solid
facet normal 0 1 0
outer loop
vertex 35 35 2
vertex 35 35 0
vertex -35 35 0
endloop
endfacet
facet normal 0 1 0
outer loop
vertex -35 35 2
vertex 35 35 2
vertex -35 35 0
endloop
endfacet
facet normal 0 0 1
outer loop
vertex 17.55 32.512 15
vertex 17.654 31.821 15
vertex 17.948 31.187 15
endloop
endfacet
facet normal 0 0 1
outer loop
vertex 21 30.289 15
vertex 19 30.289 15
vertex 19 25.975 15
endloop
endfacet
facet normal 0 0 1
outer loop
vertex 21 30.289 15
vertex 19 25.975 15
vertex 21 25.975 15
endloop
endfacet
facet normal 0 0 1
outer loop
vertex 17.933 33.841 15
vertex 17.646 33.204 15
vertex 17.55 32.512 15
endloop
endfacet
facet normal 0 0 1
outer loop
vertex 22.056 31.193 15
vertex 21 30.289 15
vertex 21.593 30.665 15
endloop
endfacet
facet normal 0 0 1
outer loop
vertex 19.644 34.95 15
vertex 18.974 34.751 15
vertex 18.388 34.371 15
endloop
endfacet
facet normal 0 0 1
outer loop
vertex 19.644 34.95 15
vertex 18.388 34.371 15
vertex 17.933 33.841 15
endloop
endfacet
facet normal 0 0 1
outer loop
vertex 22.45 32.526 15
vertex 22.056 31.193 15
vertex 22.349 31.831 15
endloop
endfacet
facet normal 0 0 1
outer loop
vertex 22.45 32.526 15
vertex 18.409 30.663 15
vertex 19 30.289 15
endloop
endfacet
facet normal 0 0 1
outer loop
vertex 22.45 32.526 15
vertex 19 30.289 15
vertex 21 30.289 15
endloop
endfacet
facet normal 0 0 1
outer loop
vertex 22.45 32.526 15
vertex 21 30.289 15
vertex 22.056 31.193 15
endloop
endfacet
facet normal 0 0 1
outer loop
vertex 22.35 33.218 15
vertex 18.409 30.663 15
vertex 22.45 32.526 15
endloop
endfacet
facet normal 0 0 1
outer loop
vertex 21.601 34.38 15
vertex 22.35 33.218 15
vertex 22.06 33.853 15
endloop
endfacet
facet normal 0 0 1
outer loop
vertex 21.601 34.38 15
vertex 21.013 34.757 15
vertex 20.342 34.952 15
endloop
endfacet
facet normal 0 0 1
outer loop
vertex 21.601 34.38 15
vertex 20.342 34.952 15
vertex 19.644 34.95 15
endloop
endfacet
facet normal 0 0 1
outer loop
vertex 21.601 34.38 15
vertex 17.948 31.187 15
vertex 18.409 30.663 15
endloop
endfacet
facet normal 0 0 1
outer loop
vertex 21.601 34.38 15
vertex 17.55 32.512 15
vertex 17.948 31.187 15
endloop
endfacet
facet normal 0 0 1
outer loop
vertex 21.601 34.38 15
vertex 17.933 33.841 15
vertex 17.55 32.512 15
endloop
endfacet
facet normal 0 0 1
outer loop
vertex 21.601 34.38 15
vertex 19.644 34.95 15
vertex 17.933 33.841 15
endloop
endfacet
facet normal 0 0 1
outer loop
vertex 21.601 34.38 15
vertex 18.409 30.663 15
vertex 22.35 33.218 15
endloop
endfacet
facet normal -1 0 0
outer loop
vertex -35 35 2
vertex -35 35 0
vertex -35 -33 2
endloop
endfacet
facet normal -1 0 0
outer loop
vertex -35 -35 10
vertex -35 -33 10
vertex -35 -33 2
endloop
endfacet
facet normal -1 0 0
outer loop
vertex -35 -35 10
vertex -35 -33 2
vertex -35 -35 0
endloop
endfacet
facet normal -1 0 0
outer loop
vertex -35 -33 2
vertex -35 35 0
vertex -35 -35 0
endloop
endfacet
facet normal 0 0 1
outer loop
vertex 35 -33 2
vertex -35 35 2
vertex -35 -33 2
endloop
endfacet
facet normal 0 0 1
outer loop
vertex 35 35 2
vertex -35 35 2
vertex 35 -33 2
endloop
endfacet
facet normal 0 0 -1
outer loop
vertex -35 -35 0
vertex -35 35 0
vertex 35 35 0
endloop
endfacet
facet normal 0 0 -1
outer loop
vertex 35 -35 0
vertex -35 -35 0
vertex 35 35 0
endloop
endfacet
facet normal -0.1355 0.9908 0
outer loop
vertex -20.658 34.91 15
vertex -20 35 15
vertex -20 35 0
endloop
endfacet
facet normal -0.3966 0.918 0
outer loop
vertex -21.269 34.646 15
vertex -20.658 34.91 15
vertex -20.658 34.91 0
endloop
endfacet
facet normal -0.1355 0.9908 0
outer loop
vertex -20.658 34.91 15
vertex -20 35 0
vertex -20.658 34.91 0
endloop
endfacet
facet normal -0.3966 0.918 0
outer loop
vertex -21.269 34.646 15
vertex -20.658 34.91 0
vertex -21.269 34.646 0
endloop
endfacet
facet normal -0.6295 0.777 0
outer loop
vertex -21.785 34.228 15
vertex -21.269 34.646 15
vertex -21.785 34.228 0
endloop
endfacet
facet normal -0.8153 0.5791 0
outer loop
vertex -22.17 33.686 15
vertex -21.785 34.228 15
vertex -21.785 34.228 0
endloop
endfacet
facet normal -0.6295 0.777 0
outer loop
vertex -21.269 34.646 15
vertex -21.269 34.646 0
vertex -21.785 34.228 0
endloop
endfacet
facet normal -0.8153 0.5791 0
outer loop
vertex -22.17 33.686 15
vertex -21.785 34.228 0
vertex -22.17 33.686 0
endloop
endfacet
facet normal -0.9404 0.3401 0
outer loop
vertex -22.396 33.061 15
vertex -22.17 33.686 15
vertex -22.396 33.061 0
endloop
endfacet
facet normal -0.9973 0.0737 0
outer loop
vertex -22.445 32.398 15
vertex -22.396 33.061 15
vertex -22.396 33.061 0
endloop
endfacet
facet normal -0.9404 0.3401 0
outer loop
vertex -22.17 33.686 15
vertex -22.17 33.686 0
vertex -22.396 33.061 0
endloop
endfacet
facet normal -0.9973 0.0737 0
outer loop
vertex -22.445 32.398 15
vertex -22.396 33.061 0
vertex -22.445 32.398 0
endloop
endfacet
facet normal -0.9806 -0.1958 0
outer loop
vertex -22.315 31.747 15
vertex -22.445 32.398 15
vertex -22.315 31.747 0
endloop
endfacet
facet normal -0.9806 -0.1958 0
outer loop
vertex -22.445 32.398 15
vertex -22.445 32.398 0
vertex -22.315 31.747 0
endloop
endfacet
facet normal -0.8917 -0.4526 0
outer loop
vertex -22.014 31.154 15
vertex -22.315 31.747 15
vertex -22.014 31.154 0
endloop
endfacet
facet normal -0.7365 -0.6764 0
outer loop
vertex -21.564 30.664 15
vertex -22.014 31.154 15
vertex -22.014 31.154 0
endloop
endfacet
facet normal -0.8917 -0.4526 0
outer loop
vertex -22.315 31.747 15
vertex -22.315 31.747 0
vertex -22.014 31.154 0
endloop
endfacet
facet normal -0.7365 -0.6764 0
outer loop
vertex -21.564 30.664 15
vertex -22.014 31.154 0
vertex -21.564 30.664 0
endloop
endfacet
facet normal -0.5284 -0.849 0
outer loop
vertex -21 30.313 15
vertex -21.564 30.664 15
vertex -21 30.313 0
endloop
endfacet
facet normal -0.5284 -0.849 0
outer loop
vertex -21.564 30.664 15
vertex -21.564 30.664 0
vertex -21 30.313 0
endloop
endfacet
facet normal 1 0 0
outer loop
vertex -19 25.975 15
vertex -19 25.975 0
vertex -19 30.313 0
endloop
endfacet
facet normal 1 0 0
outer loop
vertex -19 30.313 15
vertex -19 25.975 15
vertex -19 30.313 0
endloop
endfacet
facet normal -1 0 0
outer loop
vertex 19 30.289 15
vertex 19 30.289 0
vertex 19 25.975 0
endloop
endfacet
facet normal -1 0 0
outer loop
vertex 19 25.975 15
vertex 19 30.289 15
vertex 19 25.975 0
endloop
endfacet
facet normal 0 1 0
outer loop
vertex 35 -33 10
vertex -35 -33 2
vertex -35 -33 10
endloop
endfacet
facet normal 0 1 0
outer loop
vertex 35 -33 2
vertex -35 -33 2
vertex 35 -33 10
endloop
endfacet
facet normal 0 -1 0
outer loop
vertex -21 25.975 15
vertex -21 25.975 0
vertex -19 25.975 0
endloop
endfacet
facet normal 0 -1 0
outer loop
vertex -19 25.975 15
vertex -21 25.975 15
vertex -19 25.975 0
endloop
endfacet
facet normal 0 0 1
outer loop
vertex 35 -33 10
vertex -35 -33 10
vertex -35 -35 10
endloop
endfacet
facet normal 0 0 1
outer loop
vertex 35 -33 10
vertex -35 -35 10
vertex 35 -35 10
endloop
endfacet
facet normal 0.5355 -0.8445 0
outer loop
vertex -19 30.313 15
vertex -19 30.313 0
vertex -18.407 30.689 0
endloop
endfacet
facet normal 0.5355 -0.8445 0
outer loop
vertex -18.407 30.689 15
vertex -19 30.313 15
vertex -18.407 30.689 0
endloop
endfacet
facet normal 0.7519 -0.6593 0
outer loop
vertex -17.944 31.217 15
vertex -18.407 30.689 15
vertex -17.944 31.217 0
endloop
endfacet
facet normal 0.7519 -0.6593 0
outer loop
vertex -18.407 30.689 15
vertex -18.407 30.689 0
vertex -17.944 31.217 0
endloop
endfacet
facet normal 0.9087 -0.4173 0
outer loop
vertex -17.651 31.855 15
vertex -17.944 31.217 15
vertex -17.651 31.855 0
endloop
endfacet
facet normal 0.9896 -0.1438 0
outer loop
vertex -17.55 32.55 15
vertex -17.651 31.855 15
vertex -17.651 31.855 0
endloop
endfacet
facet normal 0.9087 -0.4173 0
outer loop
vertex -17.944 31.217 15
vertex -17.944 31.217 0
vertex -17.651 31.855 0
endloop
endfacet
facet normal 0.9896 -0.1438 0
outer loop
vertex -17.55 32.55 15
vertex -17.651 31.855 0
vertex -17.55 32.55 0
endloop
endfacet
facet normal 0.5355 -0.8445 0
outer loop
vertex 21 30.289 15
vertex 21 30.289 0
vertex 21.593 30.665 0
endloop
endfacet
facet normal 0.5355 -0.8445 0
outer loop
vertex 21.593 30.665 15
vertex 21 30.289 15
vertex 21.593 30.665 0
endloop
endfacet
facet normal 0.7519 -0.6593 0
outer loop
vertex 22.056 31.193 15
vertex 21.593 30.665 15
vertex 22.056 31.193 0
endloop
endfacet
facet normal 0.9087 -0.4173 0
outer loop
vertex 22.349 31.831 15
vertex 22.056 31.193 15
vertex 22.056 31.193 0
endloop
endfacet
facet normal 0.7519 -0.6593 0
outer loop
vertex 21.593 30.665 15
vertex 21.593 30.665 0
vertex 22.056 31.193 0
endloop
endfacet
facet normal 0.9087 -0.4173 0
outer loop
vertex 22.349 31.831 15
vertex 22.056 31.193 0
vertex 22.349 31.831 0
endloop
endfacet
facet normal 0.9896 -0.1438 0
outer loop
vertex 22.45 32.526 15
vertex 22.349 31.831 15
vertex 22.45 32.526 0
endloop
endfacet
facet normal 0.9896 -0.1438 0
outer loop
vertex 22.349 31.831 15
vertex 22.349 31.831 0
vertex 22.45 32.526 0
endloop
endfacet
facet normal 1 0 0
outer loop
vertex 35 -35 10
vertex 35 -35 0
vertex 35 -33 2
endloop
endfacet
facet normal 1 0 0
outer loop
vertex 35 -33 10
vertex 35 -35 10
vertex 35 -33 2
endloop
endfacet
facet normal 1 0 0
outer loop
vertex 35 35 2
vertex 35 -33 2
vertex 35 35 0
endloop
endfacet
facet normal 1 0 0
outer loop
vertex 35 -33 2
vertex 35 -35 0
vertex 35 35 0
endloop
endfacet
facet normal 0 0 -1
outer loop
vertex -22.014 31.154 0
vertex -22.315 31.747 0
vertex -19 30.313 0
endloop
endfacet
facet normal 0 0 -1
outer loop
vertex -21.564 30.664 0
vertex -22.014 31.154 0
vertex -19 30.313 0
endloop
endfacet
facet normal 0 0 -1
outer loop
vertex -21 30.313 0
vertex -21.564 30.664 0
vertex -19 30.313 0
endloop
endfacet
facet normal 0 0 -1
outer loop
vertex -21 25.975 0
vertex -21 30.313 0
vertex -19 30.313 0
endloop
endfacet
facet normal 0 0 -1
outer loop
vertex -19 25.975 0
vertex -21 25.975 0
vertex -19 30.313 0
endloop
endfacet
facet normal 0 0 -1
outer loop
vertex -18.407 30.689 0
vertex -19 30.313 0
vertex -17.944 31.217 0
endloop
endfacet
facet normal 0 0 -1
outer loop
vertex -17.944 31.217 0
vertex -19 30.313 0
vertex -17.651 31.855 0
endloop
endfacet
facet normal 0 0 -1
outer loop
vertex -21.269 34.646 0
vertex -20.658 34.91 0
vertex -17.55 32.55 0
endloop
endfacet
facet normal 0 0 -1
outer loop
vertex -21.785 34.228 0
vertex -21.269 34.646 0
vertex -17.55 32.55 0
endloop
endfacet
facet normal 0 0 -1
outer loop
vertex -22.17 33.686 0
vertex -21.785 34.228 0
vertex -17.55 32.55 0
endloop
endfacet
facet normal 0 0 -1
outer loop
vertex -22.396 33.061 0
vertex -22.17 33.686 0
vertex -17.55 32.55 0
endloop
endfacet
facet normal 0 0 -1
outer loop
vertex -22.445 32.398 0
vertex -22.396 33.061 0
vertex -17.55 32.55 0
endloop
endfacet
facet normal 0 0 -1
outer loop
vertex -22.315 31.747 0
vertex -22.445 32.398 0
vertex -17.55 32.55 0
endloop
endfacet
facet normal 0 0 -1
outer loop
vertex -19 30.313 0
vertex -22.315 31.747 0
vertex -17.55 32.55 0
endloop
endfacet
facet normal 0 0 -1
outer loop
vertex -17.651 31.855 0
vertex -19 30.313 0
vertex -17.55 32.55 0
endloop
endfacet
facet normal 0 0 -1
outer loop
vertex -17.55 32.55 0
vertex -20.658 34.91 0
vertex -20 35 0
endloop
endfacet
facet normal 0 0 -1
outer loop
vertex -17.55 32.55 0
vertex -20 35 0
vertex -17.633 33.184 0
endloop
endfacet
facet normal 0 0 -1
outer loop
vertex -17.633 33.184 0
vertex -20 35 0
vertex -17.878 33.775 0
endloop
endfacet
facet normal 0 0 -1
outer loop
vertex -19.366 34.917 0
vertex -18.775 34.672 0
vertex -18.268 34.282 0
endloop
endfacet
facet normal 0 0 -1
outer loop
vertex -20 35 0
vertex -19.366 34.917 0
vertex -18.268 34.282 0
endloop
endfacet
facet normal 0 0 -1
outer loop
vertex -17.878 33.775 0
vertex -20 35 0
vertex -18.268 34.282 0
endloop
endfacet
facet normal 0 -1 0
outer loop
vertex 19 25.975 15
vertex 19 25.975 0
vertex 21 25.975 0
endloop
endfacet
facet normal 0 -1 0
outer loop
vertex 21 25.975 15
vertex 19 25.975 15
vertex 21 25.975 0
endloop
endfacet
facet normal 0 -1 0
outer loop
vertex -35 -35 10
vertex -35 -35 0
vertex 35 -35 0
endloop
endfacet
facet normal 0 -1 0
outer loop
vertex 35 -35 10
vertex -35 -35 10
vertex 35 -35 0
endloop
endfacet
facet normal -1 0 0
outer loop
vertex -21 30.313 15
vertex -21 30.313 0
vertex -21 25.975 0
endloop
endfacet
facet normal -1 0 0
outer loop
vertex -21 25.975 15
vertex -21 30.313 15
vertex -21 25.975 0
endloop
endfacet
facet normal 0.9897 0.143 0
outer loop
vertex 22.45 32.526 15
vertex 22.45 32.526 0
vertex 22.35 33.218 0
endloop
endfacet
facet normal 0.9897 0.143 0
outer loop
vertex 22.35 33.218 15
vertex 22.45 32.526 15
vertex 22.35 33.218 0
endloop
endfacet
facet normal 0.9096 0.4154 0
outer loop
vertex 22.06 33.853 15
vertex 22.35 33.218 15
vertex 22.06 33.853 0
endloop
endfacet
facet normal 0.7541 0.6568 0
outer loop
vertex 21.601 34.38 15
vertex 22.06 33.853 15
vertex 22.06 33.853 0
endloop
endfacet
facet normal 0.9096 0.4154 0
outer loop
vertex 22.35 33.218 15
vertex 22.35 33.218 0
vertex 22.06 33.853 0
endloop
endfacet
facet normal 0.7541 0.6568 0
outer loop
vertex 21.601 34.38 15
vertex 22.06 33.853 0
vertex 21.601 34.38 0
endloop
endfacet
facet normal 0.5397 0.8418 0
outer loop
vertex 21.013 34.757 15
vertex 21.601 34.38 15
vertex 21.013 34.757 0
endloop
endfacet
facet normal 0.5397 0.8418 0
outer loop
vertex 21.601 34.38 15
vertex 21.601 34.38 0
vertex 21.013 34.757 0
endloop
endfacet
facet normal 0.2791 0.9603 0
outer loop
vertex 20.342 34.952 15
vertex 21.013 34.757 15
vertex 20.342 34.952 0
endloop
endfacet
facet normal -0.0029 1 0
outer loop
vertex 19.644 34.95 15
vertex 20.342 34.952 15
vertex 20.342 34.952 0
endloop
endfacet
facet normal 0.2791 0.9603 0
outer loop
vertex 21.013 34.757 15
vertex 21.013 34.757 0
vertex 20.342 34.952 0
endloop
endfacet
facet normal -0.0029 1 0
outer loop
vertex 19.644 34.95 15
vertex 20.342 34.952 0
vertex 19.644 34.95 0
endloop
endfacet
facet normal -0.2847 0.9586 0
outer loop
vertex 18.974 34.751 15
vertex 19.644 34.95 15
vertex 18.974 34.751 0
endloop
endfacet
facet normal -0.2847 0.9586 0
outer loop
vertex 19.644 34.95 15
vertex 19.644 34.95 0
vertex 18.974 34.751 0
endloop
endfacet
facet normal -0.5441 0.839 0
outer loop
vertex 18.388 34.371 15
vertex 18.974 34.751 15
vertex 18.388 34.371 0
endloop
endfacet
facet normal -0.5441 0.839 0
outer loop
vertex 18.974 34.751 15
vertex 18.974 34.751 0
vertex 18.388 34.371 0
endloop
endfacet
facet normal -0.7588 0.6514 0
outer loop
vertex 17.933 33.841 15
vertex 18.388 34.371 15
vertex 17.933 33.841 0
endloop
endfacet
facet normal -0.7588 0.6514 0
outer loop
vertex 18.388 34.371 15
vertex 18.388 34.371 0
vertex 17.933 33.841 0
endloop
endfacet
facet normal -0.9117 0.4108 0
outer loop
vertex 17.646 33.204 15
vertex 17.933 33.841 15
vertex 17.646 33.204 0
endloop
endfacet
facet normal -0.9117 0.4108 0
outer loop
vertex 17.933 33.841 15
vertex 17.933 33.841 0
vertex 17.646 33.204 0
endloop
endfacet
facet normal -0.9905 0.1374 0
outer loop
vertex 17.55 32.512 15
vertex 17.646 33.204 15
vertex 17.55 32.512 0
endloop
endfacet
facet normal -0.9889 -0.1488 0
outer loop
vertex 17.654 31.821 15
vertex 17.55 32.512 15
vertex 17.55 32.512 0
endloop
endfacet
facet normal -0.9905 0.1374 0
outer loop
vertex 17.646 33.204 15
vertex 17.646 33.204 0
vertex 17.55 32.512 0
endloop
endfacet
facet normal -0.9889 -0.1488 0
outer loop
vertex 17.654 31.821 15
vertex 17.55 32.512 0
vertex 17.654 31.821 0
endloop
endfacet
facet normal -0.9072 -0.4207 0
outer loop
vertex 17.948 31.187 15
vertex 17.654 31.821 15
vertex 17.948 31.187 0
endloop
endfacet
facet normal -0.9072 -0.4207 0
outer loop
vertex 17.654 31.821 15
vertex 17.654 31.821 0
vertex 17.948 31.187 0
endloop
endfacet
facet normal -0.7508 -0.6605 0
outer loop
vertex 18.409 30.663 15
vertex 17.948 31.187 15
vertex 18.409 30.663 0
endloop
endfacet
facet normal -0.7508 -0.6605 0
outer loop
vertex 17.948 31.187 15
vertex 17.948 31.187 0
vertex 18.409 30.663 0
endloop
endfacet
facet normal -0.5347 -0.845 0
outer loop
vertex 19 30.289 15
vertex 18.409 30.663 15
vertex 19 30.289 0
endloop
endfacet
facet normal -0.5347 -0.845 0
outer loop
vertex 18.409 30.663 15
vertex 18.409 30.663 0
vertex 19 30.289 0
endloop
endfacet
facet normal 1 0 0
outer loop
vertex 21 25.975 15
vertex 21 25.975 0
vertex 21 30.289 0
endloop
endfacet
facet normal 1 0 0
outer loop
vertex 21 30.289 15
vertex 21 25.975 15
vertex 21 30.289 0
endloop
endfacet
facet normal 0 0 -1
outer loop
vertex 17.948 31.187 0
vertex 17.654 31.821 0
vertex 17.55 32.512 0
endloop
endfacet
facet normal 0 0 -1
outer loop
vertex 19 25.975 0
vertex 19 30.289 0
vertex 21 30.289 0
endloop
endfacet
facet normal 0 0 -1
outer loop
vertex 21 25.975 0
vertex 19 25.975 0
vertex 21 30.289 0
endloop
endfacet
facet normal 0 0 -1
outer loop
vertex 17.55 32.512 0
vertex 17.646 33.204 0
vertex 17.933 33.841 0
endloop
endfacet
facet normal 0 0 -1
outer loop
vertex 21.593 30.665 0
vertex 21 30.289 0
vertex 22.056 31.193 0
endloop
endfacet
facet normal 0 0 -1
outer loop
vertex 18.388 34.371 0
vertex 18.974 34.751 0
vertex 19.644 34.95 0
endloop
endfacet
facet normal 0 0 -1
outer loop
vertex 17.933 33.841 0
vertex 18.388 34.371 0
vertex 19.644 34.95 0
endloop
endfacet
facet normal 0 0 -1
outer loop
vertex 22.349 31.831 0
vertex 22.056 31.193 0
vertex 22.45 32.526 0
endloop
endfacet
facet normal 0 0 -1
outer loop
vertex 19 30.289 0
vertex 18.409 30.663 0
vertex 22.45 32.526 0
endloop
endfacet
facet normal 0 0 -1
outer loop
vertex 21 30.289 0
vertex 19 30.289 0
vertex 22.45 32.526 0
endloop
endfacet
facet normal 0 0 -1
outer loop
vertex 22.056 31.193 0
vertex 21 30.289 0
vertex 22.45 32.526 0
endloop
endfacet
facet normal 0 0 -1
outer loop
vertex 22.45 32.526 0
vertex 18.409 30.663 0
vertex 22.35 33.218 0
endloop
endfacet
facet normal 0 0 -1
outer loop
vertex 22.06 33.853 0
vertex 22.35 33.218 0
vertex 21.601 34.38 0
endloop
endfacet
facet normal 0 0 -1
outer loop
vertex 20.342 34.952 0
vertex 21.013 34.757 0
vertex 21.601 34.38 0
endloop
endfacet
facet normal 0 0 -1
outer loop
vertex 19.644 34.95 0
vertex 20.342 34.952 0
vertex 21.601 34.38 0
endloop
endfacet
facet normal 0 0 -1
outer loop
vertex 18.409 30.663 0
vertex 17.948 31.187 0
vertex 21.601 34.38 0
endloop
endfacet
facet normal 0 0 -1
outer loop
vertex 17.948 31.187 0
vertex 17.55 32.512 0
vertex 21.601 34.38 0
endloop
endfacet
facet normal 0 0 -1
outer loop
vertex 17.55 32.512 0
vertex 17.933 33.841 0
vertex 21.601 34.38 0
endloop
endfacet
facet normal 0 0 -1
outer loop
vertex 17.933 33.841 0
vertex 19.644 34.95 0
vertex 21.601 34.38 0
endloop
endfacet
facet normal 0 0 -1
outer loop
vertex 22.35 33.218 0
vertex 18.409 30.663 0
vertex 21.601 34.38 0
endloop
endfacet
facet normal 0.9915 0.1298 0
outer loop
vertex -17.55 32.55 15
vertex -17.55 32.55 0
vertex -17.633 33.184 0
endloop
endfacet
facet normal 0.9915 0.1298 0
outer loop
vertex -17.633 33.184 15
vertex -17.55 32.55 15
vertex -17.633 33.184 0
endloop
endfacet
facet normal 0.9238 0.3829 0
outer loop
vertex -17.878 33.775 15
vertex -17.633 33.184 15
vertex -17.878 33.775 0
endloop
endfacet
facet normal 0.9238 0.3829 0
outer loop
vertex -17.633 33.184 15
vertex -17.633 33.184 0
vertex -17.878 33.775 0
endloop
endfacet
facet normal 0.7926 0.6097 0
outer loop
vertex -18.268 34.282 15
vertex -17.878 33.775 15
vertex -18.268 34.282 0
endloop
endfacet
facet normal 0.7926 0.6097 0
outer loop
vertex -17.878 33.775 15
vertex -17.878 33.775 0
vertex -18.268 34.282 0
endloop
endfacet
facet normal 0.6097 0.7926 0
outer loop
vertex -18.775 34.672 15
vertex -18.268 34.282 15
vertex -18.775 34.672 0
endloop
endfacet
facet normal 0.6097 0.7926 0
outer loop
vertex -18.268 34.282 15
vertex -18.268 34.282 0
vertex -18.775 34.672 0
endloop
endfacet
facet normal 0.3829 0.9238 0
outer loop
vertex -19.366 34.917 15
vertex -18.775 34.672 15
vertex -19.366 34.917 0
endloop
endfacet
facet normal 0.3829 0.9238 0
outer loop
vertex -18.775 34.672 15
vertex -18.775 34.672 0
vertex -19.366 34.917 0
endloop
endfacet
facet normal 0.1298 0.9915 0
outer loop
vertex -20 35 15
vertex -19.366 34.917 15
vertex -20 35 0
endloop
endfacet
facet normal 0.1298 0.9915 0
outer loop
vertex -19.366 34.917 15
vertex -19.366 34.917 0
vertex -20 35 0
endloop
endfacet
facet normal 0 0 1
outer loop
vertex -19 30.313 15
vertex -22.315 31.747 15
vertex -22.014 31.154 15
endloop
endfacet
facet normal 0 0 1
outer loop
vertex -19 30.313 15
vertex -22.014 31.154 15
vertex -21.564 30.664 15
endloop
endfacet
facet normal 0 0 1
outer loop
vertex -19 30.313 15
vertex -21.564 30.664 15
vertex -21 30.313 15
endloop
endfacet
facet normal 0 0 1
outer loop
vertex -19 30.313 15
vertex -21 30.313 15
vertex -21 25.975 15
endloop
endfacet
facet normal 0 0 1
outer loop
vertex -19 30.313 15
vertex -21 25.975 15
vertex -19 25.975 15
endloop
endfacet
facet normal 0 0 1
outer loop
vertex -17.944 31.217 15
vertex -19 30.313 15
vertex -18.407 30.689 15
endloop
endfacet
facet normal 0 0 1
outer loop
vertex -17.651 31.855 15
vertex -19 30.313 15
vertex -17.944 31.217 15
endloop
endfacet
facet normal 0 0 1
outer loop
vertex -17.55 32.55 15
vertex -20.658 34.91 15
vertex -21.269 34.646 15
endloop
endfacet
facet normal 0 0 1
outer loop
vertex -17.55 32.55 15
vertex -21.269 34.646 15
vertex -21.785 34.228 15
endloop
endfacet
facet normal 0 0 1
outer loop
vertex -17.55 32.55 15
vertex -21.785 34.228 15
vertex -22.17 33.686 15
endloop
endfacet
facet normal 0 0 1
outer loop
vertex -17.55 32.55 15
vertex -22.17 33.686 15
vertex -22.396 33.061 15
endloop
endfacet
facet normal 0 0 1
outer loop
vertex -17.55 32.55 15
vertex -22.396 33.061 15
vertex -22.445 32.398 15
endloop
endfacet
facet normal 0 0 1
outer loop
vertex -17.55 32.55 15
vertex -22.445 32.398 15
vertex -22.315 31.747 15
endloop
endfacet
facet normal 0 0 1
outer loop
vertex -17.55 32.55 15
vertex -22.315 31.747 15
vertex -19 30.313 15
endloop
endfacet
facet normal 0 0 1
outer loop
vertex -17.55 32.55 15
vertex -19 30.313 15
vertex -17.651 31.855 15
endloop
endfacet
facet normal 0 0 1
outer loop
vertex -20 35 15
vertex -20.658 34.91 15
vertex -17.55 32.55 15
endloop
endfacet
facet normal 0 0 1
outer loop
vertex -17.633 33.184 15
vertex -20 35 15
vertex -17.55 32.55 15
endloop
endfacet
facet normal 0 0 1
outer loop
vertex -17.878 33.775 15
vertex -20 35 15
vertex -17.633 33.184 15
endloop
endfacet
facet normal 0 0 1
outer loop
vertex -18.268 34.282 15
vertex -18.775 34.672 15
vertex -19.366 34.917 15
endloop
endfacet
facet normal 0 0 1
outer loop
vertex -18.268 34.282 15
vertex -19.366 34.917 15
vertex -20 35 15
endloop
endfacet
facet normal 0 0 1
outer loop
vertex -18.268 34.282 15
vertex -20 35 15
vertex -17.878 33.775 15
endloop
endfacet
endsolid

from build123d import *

# Parameters (mm, degrees)
F1_DEPTH = 15
F0_W     = 70
F0_H     = 2
F2_DEPTH = 2
F3_DEPTH = 10


with BuildPart() as f1:
    # F0 (on Top) → F1 (new body)
    with BuildSketch(Plane.XY):
        with BuildLine():
            ThreePointArc((-17.55, 32.55), (-18.267588, 34.282412), (-20, 35))
            ThreePointArc((-20, 35), (-22.396063, 33.061255), (-21, 30.313373))
            ThreePointArc((-21, 30.313373), (-20, 30.1), (-19, 30.313373))
            ThreePointArc((-19, 30.313373), (-17.944215, 31.21724), (-17.55, 32.55))
        make_face()
        with BuildLine():
            ThreePointArc((-19, 30.313373), (-20, 30.1), (-21, 30.313373))
            Line((-21, 30.313373), (-21, 25.974735))
            Line((-21, 25.974735), (-19, 25.974735))
            Line((-19, 25.974735), (-19, 30.313373))
        make_face()
        with BuildLine():
            ThreePointArc((21, 30.28943), (22.055785, 31.193297), (22.45, 32.526057))
            ThreePointArc((22.45, 32.526057), (18.66724, 34.581842), (19, 30.28943))
            ThreePointArc((19, 30.28943), (20, 30.076057), (21, 30.28943))
        make_face()
        with BuildLine():
            ThreePointArc((21, 30.28943), (20, 30.076057), (19, 30.28943))
            Line((19, 30.28943), (19, 25.974735))
            Line((19, 25.974735), (21, 25.974735))
            Line((21, 25.974735), (21, 30.28943))
        make_face()
    extrude(amount=F1_DEPTH)


with BuildPart() as f2:
    # F0 (on Top) → F2 (new body)
    with BuildSketch(Plane.XY):
        Polygon((-20, 35), (-35, 35), (-35, -33), (35, -33), (35, 35), align=None)
        with BuildLine():
            ThreePointArc((-21, 30.313373), (-22.396063, 33.061255), (-20, 35))
            ThreePointArc((-20, 35), (-18.267588, 34.282412), (-17.55, 32.55))
            ThreePointArc((-17.55, 32.55), (-17.944215, 31.21724), (-19, 30.313373))
            Line((-19, 30.313373), (-19, 25.974735))
            Line((-19, 25.974735), (-21, 25.974735))
            Line((-21, 25.974735), (-21, 30.313373))
        make_face(mode=Mode.SUBTRACT)
        with BuildLine():
            ThreePointArc((19, 30.28943), (18.66724, 34.581842), (22.45, 32.526057))
            ThreePointArc((22.45, 32.526057), (22.055785, 31.193297), (21, 30.28943))
            Line((21, 30.28943), (21, 25.974735))
            Line((21, 25.974735), (19, 25.974735))
            Line((19, 25.974735), (19, 30.28943))
        make_face(mode=Mode.SUBTRACT)
        with BuildLine():
            ThreePointArc((-19, 30.313373), (-20, 30.1), (-21, 30.313373))
            Line((-21, 30.313373), (-21, 25.974735))
            Line((-21, 25.974735), (-19, 25.974735))
            Line((-19, 25.974735), (-19, 30.313373))
        make_face()
        with BuildLine():
            ThreePointArc((-17.55, 32.55), (-18.267588, 34.282412), (-20, 35))
            ThreePointArc((-20, 35), (-22.396063, 33.061255), (-21, 30.313373))
            ThreePointArc((-21, 30.313373), (-20, 30.1), (-19, 30.313373))
            ThreePointArc((-19, 30.313373), (-17.944215, 31.21724), (-17.55, 32.55))
        make_face()
        with BuildLine():
            ThreePointArc((21, 30.28943), (22.055785, 31.193297), (22.45, 32.526057))
            ThreePointArc((22.45, 32.526057), (18.66724, 34.581842), (19, 30.28943))
            ThreePointArc((19, 30.28943), (20, 30.076057), (21, 30.28943))
        make_face()
        with BuildLine():
            ThreePointArc((21, 30.28943), (20, 30.076057), (19, 30.28943))
            Line((19, 30.28943), (19, 25.974735))
            Line((19, 25.974735), (21, 25.974735))
            Line((21, 25.974735), (21, 30.28943))
        make_face()
        with Locations((0, -34)):
            Rectangle(F0_W, F0_H)
    extrude(amount=F2_DEPTH)

    # F0 (on Top) → F3 (join)
    with BuildSketch(Plane.XY):
        with Locations((0, -34)):
            Rectangle(F0_W, F0_H)
    extrude(amount=F3_DEPTH)


solid = Compound([f1.part, f2.part])
